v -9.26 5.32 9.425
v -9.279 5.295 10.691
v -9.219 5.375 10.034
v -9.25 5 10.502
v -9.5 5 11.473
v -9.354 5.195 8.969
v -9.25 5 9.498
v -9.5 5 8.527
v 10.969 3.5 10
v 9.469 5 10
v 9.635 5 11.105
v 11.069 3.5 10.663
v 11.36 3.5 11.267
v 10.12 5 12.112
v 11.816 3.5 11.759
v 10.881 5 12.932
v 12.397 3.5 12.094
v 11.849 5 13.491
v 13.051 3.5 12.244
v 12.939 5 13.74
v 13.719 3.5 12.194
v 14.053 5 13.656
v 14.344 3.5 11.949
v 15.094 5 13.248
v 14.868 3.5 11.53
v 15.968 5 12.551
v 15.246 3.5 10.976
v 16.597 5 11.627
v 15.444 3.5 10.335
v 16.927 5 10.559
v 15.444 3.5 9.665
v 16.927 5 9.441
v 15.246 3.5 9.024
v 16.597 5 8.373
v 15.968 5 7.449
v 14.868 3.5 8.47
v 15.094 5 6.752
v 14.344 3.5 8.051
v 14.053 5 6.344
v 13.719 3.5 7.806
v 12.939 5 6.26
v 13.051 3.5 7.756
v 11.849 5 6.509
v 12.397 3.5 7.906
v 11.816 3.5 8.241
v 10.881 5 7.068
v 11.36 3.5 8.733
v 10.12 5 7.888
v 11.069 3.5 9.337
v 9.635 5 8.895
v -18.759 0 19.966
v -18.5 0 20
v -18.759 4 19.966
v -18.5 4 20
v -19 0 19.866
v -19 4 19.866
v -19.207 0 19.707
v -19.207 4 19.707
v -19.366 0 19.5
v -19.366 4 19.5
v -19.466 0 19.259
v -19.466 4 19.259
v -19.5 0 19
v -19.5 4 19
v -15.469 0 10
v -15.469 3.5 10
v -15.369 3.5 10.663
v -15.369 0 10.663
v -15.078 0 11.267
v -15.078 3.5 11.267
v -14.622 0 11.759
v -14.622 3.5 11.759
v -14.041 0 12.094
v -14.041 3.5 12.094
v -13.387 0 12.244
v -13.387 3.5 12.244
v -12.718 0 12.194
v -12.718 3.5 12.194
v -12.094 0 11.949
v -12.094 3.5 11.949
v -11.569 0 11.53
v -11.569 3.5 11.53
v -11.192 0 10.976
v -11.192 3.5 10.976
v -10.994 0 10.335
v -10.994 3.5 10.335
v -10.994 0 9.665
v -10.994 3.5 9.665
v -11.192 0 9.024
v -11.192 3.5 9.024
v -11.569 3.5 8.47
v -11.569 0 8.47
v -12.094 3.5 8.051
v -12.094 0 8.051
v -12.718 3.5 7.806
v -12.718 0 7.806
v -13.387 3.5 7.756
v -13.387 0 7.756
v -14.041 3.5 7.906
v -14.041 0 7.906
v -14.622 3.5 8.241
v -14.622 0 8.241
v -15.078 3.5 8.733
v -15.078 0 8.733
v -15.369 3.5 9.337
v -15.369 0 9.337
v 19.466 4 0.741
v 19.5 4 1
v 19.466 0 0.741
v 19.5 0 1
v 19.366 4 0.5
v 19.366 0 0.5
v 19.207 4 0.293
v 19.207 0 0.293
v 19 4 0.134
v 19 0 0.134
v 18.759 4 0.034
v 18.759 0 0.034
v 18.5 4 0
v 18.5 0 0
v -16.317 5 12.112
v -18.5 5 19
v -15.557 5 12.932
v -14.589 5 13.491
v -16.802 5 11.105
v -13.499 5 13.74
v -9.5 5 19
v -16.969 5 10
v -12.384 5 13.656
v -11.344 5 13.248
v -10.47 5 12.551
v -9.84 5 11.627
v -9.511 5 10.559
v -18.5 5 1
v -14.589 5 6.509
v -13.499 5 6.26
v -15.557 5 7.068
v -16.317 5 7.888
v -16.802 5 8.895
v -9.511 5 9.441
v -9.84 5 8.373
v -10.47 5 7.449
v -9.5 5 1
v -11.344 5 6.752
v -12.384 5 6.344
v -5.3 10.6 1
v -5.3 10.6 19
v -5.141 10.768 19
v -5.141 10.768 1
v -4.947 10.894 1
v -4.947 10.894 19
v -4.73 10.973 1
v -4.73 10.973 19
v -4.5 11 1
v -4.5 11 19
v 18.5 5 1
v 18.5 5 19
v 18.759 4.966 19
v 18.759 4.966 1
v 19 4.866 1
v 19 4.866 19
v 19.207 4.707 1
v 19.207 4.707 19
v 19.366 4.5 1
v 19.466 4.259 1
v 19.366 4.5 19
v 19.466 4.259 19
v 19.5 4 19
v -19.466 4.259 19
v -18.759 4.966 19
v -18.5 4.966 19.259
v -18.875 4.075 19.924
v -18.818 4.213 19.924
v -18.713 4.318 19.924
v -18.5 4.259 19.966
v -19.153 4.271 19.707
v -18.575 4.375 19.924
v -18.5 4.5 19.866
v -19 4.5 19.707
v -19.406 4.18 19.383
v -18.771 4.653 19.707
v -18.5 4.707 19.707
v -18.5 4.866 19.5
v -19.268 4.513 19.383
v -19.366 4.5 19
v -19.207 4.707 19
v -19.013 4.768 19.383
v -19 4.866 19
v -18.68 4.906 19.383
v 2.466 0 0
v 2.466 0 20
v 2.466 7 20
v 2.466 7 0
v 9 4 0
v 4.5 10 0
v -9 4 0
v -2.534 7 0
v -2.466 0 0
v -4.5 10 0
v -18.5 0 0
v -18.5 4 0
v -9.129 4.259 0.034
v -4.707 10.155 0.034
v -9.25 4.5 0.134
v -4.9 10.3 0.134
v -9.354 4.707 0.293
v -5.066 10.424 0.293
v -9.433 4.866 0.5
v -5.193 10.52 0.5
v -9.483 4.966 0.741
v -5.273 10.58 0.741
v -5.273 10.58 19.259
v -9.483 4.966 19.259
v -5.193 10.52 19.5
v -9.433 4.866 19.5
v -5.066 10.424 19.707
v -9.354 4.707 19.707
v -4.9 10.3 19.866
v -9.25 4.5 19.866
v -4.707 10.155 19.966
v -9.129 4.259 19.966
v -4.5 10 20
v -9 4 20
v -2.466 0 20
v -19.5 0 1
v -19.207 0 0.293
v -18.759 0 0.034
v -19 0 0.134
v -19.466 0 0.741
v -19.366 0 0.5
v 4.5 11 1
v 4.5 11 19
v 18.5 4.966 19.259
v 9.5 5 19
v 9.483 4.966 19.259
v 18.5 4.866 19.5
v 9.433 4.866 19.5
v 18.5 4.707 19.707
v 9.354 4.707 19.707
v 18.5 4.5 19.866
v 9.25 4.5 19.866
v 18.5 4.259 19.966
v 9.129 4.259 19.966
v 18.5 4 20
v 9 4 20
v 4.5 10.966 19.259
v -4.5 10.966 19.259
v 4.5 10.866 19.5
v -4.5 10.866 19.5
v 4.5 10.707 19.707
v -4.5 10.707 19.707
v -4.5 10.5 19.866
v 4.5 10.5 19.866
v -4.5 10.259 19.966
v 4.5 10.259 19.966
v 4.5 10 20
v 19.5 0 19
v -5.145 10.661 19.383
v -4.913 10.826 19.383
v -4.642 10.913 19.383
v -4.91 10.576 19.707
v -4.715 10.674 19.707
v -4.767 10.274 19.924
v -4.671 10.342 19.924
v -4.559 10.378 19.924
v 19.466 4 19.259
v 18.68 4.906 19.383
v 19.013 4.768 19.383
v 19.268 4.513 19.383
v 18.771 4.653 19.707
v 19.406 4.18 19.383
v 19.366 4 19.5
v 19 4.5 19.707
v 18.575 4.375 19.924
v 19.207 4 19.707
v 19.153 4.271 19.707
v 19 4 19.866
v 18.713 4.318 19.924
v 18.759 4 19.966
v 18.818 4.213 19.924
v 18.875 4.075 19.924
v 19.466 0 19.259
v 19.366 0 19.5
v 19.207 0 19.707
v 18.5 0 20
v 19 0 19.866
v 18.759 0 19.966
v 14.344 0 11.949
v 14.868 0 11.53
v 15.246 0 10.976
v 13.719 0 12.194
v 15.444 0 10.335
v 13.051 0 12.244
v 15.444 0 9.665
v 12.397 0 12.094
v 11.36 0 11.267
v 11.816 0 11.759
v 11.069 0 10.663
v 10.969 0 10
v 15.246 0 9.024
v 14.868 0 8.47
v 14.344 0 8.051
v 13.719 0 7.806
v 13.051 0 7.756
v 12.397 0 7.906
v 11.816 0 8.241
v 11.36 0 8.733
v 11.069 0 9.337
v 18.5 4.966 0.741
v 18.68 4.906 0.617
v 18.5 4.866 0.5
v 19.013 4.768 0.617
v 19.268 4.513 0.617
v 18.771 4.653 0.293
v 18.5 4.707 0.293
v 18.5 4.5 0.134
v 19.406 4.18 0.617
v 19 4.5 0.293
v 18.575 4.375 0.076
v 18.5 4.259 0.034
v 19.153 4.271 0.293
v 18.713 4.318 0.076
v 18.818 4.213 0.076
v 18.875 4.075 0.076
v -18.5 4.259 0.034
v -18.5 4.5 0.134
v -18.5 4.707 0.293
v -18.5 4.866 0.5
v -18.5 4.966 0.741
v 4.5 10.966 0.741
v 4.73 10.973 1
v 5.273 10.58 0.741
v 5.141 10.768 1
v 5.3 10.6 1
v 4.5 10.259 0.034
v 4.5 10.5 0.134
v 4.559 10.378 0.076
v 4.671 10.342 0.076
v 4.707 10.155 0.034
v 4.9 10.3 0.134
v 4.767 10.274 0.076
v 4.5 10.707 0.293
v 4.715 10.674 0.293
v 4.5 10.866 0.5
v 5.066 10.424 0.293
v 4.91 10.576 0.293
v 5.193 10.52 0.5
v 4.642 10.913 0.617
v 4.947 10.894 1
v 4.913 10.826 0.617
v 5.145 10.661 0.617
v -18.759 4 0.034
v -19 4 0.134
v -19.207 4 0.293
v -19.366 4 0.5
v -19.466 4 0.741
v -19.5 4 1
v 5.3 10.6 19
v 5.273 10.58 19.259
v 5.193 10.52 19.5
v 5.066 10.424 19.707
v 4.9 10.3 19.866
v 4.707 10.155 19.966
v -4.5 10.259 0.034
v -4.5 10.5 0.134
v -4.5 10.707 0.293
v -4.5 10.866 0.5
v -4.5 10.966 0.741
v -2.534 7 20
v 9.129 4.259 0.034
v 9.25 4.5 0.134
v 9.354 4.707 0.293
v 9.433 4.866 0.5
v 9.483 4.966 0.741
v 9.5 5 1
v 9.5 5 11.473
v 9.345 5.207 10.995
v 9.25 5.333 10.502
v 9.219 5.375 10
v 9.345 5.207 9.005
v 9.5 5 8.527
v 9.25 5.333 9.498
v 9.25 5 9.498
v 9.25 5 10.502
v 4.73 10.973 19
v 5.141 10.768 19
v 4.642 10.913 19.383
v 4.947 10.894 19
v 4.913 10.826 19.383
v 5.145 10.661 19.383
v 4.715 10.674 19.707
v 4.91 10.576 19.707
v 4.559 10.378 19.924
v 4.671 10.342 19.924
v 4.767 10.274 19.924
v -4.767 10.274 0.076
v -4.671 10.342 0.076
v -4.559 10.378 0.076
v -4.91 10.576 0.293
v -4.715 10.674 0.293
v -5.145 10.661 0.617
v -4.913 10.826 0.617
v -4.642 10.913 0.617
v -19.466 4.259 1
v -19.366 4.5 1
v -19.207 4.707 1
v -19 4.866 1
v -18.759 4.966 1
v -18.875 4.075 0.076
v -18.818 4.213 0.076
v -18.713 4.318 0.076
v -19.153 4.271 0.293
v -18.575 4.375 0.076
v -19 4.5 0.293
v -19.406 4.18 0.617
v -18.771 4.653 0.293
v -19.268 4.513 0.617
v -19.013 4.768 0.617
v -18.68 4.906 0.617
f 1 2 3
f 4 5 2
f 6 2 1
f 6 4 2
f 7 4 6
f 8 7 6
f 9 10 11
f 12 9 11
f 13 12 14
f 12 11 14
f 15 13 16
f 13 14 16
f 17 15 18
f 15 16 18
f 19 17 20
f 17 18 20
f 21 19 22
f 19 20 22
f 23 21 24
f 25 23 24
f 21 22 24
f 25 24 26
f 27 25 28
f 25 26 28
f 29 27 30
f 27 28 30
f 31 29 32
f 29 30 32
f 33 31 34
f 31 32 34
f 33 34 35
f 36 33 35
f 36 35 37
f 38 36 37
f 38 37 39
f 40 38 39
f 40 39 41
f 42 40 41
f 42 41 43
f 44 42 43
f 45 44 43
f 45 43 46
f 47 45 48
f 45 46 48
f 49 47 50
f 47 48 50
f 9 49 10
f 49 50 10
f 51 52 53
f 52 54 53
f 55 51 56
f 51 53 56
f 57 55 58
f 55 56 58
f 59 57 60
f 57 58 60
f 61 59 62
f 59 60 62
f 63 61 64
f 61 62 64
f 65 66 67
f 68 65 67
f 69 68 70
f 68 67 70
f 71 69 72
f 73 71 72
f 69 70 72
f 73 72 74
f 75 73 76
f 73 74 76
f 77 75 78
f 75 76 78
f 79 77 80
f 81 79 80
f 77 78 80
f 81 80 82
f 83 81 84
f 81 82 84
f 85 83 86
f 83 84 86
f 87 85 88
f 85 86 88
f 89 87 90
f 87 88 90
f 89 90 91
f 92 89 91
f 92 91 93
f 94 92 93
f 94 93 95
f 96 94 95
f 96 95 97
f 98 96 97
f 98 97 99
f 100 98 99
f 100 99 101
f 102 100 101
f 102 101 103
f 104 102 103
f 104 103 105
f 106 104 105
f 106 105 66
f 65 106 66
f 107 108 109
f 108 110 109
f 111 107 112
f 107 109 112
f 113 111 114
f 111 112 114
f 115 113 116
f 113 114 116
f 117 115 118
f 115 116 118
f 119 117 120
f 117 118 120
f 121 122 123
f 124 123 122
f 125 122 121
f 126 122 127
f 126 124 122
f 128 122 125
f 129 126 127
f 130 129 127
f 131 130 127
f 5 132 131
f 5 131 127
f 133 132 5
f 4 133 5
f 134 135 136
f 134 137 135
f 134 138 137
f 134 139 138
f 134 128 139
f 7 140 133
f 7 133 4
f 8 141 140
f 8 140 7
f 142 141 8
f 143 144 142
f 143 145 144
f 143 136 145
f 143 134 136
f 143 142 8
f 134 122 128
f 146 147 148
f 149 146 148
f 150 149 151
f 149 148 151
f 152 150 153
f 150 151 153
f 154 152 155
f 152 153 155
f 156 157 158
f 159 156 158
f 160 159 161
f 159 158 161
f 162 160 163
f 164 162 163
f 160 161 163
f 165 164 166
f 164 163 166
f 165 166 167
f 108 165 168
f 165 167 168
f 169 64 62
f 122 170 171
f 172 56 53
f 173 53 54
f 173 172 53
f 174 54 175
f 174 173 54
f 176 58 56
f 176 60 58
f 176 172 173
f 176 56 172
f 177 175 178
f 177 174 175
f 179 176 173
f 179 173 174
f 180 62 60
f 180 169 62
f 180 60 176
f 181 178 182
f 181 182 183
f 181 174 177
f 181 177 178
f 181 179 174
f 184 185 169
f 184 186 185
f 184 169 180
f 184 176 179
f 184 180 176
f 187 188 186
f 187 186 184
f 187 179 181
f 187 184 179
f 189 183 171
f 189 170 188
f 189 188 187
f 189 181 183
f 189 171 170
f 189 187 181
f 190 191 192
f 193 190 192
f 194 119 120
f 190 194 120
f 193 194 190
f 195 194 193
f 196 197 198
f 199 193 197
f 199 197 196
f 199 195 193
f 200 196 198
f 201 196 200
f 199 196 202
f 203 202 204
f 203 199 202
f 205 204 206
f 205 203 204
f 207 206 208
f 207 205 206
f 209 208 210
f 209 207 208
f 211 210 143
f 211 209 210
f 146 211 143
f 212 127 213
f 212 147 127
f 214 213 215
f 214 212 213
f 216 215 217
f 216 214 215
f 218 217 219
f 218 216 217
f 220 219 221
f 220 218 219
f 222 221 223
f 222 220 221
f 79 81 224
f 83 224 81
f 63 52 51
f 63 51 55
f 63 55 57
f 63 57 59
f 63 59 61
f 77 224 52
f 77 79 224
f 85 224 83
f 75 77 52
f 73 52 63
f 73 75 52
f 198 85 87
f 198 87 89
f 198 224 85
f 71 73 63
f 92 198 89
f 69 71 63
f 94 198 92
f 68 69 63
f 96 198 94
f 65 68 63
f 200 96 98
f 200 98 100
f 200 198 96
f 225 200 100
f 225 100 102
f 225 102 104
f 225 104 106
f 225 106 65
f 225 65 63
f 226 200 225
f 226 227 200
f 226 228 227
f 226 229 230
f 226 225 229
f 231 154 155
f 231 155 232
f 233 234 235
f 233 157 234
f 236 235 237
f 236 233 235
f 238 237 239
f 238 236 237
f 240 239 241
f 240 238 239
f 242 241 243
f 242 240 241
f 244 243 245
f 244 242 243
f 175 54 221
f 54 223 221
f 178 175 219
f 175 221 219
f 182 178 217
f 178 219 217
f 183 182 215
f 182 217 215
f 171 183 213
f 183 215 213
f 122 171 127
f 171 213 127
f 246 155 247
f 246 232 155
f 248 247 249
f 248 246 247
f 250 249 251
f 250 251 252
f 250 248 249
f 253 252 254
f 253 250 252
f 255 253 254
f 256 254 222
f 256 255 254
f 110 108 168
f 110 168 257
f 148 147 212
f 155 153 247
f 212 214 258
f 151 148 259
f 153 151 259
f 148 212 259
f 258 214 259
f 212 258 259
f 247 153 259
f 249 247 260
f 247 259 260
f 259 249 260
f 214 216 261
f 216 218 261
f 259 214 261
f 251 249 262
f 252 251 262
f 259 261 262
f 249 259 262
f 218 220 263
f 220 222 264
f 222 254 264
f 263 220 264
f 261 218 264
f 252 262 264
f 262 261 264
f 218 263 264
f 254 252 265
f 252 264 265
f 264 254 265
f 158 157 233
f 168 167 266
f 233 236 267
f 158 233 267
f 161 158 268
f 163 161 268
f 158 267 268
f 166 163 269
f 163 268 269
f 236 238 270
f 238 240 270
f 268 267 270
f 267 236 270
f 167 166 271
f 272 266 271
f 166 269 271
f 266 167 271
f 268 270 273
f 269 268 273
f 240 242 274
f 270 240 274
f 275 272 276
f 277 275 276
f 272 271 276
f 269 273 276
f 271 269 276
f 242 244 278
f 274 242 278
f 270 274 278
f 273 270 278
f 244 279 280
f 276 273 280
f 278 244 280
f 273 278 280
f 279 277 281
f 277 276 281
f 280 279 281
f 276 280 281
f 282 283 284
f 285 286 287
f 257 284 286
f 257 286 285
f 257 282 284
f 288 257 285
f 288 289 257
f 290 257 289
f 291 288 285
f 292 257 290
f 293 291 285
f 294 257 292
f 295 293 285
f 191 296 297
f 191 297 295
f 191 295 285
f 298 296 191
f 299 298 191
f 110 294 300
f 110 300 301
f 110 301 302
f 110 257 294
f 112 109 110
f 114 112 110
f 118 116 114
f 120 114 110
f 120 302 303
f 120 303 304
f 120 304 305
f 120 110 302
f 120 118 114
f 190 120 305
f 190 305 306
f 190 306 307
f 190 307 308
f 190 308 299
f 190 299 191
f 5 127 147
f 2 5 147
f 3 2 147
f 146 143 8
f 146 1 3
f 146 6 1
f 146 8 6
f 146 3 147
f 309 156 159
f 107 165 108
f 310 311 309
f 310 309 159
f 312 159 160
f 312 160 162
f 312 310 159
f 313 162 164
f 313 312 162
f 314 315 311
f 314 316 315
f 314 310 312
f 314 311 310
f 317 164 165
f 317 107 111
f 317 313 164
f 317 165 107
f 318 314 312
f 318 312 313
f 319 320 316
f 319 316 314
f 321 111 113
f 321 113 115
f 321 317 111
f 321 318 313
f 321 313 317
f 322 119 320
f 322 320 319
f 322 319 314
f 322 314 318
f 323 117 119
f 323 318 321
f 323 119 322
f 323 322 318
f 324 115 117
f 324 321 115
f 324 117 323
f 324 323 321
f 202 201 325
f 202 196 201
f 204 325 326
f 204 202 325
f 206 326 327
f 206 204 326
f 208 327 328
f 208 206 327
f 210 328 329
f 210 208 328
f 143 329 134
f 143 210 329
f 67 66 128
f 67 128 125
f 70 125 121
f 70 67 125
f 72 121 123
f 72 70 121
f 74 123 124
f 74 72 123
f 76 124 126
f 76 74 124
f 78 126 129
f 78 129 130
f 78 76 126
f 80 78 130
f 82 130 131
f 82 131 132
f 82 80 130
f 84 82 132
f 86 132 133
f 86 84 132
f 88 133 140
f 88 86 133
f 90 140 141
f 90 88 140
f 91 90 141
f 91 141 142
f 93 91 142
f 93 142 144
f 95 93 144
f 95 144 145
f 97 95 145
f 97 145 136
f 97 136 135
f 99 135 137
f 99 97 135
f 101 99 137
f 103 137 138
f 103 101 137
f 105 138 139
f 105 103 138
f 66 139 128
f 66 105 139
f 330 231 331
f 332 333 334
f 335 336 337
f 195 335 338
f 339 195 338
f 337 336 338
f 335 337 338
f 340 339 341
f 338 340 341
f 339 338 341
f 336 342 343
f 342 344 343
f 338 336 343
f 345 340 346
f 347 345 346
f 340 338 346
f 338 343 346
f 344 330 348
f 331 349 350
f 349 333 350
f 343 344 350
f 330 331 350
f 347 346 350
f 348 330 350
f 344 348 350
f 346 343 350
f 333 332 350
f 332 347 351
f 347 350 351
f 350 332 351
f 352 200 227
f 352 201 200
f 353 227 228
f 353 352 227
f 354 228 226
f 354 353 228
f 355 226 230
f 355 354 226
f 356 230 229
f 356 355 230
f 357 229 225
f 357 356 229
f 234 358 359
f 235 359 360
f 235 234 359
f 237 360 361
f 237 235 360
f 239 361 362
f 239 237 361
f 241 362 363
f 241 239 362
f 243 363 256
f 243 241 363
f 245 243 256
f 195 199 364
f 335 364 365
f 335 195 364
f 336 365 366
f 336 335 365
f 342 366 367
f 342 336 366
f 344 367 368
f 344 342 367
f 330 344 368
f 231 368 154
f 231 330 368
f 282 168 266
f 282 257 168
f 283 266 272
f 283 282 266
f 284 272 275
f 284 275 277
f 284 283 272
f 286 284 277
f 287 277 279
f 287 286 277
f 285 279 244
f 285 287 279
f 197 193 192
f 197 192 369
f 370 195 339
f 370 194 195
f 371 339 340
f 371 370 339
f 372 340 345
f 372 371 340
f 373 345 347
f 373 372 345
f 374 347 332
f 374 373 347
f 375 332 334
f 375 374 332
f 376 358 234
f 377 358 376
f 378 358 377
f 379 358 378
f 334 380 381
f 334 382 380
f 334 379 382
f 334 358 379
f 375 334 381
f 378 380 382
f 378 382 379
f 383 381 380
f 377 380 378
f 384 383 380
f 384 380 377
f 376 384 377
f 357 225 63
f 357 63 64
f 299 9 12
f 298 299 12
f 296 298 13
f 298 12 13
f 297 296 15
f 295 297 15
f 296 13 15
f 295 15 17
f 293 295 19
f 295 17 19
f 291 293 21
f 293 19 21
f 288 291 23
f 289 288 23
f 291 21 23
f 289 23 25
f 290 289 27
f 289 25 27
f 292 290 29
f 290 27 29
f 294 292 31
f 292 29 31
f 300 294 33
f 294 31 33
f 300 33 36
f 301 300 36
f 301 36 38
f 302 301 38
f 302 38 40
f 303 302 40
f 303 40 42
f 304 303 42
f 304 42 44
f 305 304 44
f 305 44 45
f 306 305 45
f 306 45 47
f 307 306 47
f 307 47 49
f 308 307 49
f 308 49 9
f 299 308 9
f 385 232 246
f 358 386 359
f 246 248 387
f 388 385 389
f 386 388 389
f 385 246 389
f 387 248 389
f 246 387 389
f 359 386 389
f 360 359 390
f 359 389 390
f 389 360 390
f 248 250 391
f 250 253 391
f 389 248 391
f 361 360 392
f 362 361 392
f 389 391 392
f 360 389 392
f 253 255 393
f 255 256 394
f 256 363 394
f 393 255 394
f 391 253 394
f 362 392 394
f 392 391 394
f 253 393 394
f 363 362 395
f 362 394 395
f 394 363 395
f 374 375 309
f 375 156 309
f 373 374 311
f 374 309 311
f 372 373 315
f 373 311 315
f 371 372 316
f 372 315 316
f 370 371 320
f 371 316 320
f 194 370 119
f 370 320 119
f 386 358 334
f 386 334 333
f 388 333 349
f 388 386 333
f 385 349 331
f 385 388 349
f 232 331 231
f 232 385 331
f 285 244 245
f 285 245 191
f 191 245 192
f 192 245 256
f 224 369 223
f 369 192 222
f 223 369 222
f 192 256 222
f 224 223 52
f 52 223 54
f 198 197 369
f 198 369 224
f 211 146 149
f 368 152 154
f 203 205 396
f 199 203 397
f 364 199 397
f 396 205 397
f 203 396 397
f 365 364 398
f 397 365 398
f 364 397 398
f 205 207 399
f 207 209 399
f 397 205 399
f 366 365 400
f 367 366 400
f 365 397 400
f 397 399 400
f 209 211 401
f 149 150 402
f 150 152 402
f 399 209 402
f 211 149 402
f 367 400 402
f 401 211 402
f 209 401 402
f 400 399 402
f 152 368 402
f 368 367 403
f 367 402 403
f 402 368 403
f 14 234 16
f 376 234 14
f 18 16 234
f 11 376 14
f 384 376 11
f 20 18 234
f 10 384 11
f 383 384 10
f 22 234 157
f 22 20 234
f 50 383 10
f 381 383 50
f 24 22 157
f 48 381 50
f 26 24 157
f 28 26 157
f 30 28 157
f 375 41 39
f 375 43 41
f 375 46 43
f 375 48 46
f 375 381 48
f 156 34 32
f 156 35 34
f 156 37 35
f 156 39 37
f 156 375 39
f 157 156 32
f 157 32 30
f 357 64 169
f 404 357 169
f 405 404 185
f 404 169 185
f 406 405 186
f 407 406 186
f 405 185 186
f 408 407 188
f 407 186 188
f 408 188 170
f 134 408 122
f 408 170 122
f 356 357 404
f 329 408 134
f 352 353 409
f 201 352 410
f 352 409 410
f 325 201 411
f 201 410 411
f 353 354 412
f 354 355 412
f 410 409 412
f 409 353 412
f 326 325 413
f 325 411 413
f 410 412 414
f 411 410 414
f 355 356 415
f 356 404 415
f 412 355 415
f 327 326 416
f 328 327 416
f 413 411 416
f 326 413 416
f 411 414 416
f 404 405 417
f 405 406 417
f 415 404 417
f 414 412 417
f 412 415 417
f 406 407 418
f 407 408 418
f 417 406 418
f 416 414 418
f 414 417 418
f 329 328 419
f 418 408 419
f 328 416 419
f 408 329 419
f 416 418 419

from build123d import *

# Parameters (mm, degrees)
PAD_DEPTH       = 20
SKETCH001_R     = 2.25
POCKET_DEPTH    = 7.001
SKETCH002_R     = 4
POCKET001_DEPTH = 5
CHAMFER_SIZE    = 1.5
FILLET_R        = 1
FILLET001_R     = 1


with BuildPart() as part:
    # Sketch (on XY_Plane of Origin) → Pad (new body)
    with BuildSketch(Plane.XY):
        Polygon((-19.5, 0), (-19.5, 5), (-9.5, 5), (-5, 11), (5, 11), (9.5, 5), (19.5, 5), (19.5, 0), (2.46556, 0), (2.46556, 7), (-2.53444, 7), (-2.46556, 0), align=None)
    extrude(amount=PAD_DEPTH)

    # Sketch001 → Pocket (cut, through all)
    with BuildSketch(Plane(origin=(0, 7, 0), x_dir=(-1, 0, 0), z_dir=(0, 1, 0))):
        with Locations((-13.21875, 10)):
            Circle(SKETCH001_R)
        with Locations((13.21875, 10)):
            Circle(SKETCH001_R)
    extrude(amount=-POCKET_DEPTH, mode=Mode.SUBTRACT)

    # Sketch002 (on Face6 of Pocket) → Pocket001 (cut)
    with BuildSketch(Plane(origin=(0, 5, 0), x_dir=(-1, 0, 0), z_dir=(0, 1, 0))):
        with Locations((-13.21875, 10)):
            Circle(SKETCH002_R)
        with Locations((13.21875, 10)):
            Circle(SKETCH002_R)
    extrude(amount=POCKET001_DEPTH, mode=Mode.SUBTRACT)

    # Chamfer
    chamfer_edges = [part.edges().sort_by_distance(p)[0] for p in [
        (-10.96875, 5, 10),
        (15.46875, 5, 10),
    ]]
    chamfer(chamfer_edges, length=CHAMFER_SIZE)

    # Fillet
    fillet_edges = [part.edges().sort_by_distance(p)[0] for p in [
        (-19.5, 5, 10),
        (-5, 11, 10),
        (5, 11, 10),
        (19.5, 5, 10),
    ]]
    fillet(fillet_edges, radius=FILLET_R)

    # Fillet001
    fillet001_edges = [part.edges().sort_by_distance(p)[0] for p in [
        (-14, 5, 20),
        (-14, 5, 0),
        (-7.4, 7.8, 0),
        (0, 11, 0),
        (7.4, 7.8, 0),
        (14, 5, 0),
        (14, 5, 20),
        (7.4, 7.8, 20),
        (0, 11, 20),
        (-7.4, 7.8, 20),
    ]]
    fillet(fillet001_edges, radius=FILLET001_R)


solid = part.part
